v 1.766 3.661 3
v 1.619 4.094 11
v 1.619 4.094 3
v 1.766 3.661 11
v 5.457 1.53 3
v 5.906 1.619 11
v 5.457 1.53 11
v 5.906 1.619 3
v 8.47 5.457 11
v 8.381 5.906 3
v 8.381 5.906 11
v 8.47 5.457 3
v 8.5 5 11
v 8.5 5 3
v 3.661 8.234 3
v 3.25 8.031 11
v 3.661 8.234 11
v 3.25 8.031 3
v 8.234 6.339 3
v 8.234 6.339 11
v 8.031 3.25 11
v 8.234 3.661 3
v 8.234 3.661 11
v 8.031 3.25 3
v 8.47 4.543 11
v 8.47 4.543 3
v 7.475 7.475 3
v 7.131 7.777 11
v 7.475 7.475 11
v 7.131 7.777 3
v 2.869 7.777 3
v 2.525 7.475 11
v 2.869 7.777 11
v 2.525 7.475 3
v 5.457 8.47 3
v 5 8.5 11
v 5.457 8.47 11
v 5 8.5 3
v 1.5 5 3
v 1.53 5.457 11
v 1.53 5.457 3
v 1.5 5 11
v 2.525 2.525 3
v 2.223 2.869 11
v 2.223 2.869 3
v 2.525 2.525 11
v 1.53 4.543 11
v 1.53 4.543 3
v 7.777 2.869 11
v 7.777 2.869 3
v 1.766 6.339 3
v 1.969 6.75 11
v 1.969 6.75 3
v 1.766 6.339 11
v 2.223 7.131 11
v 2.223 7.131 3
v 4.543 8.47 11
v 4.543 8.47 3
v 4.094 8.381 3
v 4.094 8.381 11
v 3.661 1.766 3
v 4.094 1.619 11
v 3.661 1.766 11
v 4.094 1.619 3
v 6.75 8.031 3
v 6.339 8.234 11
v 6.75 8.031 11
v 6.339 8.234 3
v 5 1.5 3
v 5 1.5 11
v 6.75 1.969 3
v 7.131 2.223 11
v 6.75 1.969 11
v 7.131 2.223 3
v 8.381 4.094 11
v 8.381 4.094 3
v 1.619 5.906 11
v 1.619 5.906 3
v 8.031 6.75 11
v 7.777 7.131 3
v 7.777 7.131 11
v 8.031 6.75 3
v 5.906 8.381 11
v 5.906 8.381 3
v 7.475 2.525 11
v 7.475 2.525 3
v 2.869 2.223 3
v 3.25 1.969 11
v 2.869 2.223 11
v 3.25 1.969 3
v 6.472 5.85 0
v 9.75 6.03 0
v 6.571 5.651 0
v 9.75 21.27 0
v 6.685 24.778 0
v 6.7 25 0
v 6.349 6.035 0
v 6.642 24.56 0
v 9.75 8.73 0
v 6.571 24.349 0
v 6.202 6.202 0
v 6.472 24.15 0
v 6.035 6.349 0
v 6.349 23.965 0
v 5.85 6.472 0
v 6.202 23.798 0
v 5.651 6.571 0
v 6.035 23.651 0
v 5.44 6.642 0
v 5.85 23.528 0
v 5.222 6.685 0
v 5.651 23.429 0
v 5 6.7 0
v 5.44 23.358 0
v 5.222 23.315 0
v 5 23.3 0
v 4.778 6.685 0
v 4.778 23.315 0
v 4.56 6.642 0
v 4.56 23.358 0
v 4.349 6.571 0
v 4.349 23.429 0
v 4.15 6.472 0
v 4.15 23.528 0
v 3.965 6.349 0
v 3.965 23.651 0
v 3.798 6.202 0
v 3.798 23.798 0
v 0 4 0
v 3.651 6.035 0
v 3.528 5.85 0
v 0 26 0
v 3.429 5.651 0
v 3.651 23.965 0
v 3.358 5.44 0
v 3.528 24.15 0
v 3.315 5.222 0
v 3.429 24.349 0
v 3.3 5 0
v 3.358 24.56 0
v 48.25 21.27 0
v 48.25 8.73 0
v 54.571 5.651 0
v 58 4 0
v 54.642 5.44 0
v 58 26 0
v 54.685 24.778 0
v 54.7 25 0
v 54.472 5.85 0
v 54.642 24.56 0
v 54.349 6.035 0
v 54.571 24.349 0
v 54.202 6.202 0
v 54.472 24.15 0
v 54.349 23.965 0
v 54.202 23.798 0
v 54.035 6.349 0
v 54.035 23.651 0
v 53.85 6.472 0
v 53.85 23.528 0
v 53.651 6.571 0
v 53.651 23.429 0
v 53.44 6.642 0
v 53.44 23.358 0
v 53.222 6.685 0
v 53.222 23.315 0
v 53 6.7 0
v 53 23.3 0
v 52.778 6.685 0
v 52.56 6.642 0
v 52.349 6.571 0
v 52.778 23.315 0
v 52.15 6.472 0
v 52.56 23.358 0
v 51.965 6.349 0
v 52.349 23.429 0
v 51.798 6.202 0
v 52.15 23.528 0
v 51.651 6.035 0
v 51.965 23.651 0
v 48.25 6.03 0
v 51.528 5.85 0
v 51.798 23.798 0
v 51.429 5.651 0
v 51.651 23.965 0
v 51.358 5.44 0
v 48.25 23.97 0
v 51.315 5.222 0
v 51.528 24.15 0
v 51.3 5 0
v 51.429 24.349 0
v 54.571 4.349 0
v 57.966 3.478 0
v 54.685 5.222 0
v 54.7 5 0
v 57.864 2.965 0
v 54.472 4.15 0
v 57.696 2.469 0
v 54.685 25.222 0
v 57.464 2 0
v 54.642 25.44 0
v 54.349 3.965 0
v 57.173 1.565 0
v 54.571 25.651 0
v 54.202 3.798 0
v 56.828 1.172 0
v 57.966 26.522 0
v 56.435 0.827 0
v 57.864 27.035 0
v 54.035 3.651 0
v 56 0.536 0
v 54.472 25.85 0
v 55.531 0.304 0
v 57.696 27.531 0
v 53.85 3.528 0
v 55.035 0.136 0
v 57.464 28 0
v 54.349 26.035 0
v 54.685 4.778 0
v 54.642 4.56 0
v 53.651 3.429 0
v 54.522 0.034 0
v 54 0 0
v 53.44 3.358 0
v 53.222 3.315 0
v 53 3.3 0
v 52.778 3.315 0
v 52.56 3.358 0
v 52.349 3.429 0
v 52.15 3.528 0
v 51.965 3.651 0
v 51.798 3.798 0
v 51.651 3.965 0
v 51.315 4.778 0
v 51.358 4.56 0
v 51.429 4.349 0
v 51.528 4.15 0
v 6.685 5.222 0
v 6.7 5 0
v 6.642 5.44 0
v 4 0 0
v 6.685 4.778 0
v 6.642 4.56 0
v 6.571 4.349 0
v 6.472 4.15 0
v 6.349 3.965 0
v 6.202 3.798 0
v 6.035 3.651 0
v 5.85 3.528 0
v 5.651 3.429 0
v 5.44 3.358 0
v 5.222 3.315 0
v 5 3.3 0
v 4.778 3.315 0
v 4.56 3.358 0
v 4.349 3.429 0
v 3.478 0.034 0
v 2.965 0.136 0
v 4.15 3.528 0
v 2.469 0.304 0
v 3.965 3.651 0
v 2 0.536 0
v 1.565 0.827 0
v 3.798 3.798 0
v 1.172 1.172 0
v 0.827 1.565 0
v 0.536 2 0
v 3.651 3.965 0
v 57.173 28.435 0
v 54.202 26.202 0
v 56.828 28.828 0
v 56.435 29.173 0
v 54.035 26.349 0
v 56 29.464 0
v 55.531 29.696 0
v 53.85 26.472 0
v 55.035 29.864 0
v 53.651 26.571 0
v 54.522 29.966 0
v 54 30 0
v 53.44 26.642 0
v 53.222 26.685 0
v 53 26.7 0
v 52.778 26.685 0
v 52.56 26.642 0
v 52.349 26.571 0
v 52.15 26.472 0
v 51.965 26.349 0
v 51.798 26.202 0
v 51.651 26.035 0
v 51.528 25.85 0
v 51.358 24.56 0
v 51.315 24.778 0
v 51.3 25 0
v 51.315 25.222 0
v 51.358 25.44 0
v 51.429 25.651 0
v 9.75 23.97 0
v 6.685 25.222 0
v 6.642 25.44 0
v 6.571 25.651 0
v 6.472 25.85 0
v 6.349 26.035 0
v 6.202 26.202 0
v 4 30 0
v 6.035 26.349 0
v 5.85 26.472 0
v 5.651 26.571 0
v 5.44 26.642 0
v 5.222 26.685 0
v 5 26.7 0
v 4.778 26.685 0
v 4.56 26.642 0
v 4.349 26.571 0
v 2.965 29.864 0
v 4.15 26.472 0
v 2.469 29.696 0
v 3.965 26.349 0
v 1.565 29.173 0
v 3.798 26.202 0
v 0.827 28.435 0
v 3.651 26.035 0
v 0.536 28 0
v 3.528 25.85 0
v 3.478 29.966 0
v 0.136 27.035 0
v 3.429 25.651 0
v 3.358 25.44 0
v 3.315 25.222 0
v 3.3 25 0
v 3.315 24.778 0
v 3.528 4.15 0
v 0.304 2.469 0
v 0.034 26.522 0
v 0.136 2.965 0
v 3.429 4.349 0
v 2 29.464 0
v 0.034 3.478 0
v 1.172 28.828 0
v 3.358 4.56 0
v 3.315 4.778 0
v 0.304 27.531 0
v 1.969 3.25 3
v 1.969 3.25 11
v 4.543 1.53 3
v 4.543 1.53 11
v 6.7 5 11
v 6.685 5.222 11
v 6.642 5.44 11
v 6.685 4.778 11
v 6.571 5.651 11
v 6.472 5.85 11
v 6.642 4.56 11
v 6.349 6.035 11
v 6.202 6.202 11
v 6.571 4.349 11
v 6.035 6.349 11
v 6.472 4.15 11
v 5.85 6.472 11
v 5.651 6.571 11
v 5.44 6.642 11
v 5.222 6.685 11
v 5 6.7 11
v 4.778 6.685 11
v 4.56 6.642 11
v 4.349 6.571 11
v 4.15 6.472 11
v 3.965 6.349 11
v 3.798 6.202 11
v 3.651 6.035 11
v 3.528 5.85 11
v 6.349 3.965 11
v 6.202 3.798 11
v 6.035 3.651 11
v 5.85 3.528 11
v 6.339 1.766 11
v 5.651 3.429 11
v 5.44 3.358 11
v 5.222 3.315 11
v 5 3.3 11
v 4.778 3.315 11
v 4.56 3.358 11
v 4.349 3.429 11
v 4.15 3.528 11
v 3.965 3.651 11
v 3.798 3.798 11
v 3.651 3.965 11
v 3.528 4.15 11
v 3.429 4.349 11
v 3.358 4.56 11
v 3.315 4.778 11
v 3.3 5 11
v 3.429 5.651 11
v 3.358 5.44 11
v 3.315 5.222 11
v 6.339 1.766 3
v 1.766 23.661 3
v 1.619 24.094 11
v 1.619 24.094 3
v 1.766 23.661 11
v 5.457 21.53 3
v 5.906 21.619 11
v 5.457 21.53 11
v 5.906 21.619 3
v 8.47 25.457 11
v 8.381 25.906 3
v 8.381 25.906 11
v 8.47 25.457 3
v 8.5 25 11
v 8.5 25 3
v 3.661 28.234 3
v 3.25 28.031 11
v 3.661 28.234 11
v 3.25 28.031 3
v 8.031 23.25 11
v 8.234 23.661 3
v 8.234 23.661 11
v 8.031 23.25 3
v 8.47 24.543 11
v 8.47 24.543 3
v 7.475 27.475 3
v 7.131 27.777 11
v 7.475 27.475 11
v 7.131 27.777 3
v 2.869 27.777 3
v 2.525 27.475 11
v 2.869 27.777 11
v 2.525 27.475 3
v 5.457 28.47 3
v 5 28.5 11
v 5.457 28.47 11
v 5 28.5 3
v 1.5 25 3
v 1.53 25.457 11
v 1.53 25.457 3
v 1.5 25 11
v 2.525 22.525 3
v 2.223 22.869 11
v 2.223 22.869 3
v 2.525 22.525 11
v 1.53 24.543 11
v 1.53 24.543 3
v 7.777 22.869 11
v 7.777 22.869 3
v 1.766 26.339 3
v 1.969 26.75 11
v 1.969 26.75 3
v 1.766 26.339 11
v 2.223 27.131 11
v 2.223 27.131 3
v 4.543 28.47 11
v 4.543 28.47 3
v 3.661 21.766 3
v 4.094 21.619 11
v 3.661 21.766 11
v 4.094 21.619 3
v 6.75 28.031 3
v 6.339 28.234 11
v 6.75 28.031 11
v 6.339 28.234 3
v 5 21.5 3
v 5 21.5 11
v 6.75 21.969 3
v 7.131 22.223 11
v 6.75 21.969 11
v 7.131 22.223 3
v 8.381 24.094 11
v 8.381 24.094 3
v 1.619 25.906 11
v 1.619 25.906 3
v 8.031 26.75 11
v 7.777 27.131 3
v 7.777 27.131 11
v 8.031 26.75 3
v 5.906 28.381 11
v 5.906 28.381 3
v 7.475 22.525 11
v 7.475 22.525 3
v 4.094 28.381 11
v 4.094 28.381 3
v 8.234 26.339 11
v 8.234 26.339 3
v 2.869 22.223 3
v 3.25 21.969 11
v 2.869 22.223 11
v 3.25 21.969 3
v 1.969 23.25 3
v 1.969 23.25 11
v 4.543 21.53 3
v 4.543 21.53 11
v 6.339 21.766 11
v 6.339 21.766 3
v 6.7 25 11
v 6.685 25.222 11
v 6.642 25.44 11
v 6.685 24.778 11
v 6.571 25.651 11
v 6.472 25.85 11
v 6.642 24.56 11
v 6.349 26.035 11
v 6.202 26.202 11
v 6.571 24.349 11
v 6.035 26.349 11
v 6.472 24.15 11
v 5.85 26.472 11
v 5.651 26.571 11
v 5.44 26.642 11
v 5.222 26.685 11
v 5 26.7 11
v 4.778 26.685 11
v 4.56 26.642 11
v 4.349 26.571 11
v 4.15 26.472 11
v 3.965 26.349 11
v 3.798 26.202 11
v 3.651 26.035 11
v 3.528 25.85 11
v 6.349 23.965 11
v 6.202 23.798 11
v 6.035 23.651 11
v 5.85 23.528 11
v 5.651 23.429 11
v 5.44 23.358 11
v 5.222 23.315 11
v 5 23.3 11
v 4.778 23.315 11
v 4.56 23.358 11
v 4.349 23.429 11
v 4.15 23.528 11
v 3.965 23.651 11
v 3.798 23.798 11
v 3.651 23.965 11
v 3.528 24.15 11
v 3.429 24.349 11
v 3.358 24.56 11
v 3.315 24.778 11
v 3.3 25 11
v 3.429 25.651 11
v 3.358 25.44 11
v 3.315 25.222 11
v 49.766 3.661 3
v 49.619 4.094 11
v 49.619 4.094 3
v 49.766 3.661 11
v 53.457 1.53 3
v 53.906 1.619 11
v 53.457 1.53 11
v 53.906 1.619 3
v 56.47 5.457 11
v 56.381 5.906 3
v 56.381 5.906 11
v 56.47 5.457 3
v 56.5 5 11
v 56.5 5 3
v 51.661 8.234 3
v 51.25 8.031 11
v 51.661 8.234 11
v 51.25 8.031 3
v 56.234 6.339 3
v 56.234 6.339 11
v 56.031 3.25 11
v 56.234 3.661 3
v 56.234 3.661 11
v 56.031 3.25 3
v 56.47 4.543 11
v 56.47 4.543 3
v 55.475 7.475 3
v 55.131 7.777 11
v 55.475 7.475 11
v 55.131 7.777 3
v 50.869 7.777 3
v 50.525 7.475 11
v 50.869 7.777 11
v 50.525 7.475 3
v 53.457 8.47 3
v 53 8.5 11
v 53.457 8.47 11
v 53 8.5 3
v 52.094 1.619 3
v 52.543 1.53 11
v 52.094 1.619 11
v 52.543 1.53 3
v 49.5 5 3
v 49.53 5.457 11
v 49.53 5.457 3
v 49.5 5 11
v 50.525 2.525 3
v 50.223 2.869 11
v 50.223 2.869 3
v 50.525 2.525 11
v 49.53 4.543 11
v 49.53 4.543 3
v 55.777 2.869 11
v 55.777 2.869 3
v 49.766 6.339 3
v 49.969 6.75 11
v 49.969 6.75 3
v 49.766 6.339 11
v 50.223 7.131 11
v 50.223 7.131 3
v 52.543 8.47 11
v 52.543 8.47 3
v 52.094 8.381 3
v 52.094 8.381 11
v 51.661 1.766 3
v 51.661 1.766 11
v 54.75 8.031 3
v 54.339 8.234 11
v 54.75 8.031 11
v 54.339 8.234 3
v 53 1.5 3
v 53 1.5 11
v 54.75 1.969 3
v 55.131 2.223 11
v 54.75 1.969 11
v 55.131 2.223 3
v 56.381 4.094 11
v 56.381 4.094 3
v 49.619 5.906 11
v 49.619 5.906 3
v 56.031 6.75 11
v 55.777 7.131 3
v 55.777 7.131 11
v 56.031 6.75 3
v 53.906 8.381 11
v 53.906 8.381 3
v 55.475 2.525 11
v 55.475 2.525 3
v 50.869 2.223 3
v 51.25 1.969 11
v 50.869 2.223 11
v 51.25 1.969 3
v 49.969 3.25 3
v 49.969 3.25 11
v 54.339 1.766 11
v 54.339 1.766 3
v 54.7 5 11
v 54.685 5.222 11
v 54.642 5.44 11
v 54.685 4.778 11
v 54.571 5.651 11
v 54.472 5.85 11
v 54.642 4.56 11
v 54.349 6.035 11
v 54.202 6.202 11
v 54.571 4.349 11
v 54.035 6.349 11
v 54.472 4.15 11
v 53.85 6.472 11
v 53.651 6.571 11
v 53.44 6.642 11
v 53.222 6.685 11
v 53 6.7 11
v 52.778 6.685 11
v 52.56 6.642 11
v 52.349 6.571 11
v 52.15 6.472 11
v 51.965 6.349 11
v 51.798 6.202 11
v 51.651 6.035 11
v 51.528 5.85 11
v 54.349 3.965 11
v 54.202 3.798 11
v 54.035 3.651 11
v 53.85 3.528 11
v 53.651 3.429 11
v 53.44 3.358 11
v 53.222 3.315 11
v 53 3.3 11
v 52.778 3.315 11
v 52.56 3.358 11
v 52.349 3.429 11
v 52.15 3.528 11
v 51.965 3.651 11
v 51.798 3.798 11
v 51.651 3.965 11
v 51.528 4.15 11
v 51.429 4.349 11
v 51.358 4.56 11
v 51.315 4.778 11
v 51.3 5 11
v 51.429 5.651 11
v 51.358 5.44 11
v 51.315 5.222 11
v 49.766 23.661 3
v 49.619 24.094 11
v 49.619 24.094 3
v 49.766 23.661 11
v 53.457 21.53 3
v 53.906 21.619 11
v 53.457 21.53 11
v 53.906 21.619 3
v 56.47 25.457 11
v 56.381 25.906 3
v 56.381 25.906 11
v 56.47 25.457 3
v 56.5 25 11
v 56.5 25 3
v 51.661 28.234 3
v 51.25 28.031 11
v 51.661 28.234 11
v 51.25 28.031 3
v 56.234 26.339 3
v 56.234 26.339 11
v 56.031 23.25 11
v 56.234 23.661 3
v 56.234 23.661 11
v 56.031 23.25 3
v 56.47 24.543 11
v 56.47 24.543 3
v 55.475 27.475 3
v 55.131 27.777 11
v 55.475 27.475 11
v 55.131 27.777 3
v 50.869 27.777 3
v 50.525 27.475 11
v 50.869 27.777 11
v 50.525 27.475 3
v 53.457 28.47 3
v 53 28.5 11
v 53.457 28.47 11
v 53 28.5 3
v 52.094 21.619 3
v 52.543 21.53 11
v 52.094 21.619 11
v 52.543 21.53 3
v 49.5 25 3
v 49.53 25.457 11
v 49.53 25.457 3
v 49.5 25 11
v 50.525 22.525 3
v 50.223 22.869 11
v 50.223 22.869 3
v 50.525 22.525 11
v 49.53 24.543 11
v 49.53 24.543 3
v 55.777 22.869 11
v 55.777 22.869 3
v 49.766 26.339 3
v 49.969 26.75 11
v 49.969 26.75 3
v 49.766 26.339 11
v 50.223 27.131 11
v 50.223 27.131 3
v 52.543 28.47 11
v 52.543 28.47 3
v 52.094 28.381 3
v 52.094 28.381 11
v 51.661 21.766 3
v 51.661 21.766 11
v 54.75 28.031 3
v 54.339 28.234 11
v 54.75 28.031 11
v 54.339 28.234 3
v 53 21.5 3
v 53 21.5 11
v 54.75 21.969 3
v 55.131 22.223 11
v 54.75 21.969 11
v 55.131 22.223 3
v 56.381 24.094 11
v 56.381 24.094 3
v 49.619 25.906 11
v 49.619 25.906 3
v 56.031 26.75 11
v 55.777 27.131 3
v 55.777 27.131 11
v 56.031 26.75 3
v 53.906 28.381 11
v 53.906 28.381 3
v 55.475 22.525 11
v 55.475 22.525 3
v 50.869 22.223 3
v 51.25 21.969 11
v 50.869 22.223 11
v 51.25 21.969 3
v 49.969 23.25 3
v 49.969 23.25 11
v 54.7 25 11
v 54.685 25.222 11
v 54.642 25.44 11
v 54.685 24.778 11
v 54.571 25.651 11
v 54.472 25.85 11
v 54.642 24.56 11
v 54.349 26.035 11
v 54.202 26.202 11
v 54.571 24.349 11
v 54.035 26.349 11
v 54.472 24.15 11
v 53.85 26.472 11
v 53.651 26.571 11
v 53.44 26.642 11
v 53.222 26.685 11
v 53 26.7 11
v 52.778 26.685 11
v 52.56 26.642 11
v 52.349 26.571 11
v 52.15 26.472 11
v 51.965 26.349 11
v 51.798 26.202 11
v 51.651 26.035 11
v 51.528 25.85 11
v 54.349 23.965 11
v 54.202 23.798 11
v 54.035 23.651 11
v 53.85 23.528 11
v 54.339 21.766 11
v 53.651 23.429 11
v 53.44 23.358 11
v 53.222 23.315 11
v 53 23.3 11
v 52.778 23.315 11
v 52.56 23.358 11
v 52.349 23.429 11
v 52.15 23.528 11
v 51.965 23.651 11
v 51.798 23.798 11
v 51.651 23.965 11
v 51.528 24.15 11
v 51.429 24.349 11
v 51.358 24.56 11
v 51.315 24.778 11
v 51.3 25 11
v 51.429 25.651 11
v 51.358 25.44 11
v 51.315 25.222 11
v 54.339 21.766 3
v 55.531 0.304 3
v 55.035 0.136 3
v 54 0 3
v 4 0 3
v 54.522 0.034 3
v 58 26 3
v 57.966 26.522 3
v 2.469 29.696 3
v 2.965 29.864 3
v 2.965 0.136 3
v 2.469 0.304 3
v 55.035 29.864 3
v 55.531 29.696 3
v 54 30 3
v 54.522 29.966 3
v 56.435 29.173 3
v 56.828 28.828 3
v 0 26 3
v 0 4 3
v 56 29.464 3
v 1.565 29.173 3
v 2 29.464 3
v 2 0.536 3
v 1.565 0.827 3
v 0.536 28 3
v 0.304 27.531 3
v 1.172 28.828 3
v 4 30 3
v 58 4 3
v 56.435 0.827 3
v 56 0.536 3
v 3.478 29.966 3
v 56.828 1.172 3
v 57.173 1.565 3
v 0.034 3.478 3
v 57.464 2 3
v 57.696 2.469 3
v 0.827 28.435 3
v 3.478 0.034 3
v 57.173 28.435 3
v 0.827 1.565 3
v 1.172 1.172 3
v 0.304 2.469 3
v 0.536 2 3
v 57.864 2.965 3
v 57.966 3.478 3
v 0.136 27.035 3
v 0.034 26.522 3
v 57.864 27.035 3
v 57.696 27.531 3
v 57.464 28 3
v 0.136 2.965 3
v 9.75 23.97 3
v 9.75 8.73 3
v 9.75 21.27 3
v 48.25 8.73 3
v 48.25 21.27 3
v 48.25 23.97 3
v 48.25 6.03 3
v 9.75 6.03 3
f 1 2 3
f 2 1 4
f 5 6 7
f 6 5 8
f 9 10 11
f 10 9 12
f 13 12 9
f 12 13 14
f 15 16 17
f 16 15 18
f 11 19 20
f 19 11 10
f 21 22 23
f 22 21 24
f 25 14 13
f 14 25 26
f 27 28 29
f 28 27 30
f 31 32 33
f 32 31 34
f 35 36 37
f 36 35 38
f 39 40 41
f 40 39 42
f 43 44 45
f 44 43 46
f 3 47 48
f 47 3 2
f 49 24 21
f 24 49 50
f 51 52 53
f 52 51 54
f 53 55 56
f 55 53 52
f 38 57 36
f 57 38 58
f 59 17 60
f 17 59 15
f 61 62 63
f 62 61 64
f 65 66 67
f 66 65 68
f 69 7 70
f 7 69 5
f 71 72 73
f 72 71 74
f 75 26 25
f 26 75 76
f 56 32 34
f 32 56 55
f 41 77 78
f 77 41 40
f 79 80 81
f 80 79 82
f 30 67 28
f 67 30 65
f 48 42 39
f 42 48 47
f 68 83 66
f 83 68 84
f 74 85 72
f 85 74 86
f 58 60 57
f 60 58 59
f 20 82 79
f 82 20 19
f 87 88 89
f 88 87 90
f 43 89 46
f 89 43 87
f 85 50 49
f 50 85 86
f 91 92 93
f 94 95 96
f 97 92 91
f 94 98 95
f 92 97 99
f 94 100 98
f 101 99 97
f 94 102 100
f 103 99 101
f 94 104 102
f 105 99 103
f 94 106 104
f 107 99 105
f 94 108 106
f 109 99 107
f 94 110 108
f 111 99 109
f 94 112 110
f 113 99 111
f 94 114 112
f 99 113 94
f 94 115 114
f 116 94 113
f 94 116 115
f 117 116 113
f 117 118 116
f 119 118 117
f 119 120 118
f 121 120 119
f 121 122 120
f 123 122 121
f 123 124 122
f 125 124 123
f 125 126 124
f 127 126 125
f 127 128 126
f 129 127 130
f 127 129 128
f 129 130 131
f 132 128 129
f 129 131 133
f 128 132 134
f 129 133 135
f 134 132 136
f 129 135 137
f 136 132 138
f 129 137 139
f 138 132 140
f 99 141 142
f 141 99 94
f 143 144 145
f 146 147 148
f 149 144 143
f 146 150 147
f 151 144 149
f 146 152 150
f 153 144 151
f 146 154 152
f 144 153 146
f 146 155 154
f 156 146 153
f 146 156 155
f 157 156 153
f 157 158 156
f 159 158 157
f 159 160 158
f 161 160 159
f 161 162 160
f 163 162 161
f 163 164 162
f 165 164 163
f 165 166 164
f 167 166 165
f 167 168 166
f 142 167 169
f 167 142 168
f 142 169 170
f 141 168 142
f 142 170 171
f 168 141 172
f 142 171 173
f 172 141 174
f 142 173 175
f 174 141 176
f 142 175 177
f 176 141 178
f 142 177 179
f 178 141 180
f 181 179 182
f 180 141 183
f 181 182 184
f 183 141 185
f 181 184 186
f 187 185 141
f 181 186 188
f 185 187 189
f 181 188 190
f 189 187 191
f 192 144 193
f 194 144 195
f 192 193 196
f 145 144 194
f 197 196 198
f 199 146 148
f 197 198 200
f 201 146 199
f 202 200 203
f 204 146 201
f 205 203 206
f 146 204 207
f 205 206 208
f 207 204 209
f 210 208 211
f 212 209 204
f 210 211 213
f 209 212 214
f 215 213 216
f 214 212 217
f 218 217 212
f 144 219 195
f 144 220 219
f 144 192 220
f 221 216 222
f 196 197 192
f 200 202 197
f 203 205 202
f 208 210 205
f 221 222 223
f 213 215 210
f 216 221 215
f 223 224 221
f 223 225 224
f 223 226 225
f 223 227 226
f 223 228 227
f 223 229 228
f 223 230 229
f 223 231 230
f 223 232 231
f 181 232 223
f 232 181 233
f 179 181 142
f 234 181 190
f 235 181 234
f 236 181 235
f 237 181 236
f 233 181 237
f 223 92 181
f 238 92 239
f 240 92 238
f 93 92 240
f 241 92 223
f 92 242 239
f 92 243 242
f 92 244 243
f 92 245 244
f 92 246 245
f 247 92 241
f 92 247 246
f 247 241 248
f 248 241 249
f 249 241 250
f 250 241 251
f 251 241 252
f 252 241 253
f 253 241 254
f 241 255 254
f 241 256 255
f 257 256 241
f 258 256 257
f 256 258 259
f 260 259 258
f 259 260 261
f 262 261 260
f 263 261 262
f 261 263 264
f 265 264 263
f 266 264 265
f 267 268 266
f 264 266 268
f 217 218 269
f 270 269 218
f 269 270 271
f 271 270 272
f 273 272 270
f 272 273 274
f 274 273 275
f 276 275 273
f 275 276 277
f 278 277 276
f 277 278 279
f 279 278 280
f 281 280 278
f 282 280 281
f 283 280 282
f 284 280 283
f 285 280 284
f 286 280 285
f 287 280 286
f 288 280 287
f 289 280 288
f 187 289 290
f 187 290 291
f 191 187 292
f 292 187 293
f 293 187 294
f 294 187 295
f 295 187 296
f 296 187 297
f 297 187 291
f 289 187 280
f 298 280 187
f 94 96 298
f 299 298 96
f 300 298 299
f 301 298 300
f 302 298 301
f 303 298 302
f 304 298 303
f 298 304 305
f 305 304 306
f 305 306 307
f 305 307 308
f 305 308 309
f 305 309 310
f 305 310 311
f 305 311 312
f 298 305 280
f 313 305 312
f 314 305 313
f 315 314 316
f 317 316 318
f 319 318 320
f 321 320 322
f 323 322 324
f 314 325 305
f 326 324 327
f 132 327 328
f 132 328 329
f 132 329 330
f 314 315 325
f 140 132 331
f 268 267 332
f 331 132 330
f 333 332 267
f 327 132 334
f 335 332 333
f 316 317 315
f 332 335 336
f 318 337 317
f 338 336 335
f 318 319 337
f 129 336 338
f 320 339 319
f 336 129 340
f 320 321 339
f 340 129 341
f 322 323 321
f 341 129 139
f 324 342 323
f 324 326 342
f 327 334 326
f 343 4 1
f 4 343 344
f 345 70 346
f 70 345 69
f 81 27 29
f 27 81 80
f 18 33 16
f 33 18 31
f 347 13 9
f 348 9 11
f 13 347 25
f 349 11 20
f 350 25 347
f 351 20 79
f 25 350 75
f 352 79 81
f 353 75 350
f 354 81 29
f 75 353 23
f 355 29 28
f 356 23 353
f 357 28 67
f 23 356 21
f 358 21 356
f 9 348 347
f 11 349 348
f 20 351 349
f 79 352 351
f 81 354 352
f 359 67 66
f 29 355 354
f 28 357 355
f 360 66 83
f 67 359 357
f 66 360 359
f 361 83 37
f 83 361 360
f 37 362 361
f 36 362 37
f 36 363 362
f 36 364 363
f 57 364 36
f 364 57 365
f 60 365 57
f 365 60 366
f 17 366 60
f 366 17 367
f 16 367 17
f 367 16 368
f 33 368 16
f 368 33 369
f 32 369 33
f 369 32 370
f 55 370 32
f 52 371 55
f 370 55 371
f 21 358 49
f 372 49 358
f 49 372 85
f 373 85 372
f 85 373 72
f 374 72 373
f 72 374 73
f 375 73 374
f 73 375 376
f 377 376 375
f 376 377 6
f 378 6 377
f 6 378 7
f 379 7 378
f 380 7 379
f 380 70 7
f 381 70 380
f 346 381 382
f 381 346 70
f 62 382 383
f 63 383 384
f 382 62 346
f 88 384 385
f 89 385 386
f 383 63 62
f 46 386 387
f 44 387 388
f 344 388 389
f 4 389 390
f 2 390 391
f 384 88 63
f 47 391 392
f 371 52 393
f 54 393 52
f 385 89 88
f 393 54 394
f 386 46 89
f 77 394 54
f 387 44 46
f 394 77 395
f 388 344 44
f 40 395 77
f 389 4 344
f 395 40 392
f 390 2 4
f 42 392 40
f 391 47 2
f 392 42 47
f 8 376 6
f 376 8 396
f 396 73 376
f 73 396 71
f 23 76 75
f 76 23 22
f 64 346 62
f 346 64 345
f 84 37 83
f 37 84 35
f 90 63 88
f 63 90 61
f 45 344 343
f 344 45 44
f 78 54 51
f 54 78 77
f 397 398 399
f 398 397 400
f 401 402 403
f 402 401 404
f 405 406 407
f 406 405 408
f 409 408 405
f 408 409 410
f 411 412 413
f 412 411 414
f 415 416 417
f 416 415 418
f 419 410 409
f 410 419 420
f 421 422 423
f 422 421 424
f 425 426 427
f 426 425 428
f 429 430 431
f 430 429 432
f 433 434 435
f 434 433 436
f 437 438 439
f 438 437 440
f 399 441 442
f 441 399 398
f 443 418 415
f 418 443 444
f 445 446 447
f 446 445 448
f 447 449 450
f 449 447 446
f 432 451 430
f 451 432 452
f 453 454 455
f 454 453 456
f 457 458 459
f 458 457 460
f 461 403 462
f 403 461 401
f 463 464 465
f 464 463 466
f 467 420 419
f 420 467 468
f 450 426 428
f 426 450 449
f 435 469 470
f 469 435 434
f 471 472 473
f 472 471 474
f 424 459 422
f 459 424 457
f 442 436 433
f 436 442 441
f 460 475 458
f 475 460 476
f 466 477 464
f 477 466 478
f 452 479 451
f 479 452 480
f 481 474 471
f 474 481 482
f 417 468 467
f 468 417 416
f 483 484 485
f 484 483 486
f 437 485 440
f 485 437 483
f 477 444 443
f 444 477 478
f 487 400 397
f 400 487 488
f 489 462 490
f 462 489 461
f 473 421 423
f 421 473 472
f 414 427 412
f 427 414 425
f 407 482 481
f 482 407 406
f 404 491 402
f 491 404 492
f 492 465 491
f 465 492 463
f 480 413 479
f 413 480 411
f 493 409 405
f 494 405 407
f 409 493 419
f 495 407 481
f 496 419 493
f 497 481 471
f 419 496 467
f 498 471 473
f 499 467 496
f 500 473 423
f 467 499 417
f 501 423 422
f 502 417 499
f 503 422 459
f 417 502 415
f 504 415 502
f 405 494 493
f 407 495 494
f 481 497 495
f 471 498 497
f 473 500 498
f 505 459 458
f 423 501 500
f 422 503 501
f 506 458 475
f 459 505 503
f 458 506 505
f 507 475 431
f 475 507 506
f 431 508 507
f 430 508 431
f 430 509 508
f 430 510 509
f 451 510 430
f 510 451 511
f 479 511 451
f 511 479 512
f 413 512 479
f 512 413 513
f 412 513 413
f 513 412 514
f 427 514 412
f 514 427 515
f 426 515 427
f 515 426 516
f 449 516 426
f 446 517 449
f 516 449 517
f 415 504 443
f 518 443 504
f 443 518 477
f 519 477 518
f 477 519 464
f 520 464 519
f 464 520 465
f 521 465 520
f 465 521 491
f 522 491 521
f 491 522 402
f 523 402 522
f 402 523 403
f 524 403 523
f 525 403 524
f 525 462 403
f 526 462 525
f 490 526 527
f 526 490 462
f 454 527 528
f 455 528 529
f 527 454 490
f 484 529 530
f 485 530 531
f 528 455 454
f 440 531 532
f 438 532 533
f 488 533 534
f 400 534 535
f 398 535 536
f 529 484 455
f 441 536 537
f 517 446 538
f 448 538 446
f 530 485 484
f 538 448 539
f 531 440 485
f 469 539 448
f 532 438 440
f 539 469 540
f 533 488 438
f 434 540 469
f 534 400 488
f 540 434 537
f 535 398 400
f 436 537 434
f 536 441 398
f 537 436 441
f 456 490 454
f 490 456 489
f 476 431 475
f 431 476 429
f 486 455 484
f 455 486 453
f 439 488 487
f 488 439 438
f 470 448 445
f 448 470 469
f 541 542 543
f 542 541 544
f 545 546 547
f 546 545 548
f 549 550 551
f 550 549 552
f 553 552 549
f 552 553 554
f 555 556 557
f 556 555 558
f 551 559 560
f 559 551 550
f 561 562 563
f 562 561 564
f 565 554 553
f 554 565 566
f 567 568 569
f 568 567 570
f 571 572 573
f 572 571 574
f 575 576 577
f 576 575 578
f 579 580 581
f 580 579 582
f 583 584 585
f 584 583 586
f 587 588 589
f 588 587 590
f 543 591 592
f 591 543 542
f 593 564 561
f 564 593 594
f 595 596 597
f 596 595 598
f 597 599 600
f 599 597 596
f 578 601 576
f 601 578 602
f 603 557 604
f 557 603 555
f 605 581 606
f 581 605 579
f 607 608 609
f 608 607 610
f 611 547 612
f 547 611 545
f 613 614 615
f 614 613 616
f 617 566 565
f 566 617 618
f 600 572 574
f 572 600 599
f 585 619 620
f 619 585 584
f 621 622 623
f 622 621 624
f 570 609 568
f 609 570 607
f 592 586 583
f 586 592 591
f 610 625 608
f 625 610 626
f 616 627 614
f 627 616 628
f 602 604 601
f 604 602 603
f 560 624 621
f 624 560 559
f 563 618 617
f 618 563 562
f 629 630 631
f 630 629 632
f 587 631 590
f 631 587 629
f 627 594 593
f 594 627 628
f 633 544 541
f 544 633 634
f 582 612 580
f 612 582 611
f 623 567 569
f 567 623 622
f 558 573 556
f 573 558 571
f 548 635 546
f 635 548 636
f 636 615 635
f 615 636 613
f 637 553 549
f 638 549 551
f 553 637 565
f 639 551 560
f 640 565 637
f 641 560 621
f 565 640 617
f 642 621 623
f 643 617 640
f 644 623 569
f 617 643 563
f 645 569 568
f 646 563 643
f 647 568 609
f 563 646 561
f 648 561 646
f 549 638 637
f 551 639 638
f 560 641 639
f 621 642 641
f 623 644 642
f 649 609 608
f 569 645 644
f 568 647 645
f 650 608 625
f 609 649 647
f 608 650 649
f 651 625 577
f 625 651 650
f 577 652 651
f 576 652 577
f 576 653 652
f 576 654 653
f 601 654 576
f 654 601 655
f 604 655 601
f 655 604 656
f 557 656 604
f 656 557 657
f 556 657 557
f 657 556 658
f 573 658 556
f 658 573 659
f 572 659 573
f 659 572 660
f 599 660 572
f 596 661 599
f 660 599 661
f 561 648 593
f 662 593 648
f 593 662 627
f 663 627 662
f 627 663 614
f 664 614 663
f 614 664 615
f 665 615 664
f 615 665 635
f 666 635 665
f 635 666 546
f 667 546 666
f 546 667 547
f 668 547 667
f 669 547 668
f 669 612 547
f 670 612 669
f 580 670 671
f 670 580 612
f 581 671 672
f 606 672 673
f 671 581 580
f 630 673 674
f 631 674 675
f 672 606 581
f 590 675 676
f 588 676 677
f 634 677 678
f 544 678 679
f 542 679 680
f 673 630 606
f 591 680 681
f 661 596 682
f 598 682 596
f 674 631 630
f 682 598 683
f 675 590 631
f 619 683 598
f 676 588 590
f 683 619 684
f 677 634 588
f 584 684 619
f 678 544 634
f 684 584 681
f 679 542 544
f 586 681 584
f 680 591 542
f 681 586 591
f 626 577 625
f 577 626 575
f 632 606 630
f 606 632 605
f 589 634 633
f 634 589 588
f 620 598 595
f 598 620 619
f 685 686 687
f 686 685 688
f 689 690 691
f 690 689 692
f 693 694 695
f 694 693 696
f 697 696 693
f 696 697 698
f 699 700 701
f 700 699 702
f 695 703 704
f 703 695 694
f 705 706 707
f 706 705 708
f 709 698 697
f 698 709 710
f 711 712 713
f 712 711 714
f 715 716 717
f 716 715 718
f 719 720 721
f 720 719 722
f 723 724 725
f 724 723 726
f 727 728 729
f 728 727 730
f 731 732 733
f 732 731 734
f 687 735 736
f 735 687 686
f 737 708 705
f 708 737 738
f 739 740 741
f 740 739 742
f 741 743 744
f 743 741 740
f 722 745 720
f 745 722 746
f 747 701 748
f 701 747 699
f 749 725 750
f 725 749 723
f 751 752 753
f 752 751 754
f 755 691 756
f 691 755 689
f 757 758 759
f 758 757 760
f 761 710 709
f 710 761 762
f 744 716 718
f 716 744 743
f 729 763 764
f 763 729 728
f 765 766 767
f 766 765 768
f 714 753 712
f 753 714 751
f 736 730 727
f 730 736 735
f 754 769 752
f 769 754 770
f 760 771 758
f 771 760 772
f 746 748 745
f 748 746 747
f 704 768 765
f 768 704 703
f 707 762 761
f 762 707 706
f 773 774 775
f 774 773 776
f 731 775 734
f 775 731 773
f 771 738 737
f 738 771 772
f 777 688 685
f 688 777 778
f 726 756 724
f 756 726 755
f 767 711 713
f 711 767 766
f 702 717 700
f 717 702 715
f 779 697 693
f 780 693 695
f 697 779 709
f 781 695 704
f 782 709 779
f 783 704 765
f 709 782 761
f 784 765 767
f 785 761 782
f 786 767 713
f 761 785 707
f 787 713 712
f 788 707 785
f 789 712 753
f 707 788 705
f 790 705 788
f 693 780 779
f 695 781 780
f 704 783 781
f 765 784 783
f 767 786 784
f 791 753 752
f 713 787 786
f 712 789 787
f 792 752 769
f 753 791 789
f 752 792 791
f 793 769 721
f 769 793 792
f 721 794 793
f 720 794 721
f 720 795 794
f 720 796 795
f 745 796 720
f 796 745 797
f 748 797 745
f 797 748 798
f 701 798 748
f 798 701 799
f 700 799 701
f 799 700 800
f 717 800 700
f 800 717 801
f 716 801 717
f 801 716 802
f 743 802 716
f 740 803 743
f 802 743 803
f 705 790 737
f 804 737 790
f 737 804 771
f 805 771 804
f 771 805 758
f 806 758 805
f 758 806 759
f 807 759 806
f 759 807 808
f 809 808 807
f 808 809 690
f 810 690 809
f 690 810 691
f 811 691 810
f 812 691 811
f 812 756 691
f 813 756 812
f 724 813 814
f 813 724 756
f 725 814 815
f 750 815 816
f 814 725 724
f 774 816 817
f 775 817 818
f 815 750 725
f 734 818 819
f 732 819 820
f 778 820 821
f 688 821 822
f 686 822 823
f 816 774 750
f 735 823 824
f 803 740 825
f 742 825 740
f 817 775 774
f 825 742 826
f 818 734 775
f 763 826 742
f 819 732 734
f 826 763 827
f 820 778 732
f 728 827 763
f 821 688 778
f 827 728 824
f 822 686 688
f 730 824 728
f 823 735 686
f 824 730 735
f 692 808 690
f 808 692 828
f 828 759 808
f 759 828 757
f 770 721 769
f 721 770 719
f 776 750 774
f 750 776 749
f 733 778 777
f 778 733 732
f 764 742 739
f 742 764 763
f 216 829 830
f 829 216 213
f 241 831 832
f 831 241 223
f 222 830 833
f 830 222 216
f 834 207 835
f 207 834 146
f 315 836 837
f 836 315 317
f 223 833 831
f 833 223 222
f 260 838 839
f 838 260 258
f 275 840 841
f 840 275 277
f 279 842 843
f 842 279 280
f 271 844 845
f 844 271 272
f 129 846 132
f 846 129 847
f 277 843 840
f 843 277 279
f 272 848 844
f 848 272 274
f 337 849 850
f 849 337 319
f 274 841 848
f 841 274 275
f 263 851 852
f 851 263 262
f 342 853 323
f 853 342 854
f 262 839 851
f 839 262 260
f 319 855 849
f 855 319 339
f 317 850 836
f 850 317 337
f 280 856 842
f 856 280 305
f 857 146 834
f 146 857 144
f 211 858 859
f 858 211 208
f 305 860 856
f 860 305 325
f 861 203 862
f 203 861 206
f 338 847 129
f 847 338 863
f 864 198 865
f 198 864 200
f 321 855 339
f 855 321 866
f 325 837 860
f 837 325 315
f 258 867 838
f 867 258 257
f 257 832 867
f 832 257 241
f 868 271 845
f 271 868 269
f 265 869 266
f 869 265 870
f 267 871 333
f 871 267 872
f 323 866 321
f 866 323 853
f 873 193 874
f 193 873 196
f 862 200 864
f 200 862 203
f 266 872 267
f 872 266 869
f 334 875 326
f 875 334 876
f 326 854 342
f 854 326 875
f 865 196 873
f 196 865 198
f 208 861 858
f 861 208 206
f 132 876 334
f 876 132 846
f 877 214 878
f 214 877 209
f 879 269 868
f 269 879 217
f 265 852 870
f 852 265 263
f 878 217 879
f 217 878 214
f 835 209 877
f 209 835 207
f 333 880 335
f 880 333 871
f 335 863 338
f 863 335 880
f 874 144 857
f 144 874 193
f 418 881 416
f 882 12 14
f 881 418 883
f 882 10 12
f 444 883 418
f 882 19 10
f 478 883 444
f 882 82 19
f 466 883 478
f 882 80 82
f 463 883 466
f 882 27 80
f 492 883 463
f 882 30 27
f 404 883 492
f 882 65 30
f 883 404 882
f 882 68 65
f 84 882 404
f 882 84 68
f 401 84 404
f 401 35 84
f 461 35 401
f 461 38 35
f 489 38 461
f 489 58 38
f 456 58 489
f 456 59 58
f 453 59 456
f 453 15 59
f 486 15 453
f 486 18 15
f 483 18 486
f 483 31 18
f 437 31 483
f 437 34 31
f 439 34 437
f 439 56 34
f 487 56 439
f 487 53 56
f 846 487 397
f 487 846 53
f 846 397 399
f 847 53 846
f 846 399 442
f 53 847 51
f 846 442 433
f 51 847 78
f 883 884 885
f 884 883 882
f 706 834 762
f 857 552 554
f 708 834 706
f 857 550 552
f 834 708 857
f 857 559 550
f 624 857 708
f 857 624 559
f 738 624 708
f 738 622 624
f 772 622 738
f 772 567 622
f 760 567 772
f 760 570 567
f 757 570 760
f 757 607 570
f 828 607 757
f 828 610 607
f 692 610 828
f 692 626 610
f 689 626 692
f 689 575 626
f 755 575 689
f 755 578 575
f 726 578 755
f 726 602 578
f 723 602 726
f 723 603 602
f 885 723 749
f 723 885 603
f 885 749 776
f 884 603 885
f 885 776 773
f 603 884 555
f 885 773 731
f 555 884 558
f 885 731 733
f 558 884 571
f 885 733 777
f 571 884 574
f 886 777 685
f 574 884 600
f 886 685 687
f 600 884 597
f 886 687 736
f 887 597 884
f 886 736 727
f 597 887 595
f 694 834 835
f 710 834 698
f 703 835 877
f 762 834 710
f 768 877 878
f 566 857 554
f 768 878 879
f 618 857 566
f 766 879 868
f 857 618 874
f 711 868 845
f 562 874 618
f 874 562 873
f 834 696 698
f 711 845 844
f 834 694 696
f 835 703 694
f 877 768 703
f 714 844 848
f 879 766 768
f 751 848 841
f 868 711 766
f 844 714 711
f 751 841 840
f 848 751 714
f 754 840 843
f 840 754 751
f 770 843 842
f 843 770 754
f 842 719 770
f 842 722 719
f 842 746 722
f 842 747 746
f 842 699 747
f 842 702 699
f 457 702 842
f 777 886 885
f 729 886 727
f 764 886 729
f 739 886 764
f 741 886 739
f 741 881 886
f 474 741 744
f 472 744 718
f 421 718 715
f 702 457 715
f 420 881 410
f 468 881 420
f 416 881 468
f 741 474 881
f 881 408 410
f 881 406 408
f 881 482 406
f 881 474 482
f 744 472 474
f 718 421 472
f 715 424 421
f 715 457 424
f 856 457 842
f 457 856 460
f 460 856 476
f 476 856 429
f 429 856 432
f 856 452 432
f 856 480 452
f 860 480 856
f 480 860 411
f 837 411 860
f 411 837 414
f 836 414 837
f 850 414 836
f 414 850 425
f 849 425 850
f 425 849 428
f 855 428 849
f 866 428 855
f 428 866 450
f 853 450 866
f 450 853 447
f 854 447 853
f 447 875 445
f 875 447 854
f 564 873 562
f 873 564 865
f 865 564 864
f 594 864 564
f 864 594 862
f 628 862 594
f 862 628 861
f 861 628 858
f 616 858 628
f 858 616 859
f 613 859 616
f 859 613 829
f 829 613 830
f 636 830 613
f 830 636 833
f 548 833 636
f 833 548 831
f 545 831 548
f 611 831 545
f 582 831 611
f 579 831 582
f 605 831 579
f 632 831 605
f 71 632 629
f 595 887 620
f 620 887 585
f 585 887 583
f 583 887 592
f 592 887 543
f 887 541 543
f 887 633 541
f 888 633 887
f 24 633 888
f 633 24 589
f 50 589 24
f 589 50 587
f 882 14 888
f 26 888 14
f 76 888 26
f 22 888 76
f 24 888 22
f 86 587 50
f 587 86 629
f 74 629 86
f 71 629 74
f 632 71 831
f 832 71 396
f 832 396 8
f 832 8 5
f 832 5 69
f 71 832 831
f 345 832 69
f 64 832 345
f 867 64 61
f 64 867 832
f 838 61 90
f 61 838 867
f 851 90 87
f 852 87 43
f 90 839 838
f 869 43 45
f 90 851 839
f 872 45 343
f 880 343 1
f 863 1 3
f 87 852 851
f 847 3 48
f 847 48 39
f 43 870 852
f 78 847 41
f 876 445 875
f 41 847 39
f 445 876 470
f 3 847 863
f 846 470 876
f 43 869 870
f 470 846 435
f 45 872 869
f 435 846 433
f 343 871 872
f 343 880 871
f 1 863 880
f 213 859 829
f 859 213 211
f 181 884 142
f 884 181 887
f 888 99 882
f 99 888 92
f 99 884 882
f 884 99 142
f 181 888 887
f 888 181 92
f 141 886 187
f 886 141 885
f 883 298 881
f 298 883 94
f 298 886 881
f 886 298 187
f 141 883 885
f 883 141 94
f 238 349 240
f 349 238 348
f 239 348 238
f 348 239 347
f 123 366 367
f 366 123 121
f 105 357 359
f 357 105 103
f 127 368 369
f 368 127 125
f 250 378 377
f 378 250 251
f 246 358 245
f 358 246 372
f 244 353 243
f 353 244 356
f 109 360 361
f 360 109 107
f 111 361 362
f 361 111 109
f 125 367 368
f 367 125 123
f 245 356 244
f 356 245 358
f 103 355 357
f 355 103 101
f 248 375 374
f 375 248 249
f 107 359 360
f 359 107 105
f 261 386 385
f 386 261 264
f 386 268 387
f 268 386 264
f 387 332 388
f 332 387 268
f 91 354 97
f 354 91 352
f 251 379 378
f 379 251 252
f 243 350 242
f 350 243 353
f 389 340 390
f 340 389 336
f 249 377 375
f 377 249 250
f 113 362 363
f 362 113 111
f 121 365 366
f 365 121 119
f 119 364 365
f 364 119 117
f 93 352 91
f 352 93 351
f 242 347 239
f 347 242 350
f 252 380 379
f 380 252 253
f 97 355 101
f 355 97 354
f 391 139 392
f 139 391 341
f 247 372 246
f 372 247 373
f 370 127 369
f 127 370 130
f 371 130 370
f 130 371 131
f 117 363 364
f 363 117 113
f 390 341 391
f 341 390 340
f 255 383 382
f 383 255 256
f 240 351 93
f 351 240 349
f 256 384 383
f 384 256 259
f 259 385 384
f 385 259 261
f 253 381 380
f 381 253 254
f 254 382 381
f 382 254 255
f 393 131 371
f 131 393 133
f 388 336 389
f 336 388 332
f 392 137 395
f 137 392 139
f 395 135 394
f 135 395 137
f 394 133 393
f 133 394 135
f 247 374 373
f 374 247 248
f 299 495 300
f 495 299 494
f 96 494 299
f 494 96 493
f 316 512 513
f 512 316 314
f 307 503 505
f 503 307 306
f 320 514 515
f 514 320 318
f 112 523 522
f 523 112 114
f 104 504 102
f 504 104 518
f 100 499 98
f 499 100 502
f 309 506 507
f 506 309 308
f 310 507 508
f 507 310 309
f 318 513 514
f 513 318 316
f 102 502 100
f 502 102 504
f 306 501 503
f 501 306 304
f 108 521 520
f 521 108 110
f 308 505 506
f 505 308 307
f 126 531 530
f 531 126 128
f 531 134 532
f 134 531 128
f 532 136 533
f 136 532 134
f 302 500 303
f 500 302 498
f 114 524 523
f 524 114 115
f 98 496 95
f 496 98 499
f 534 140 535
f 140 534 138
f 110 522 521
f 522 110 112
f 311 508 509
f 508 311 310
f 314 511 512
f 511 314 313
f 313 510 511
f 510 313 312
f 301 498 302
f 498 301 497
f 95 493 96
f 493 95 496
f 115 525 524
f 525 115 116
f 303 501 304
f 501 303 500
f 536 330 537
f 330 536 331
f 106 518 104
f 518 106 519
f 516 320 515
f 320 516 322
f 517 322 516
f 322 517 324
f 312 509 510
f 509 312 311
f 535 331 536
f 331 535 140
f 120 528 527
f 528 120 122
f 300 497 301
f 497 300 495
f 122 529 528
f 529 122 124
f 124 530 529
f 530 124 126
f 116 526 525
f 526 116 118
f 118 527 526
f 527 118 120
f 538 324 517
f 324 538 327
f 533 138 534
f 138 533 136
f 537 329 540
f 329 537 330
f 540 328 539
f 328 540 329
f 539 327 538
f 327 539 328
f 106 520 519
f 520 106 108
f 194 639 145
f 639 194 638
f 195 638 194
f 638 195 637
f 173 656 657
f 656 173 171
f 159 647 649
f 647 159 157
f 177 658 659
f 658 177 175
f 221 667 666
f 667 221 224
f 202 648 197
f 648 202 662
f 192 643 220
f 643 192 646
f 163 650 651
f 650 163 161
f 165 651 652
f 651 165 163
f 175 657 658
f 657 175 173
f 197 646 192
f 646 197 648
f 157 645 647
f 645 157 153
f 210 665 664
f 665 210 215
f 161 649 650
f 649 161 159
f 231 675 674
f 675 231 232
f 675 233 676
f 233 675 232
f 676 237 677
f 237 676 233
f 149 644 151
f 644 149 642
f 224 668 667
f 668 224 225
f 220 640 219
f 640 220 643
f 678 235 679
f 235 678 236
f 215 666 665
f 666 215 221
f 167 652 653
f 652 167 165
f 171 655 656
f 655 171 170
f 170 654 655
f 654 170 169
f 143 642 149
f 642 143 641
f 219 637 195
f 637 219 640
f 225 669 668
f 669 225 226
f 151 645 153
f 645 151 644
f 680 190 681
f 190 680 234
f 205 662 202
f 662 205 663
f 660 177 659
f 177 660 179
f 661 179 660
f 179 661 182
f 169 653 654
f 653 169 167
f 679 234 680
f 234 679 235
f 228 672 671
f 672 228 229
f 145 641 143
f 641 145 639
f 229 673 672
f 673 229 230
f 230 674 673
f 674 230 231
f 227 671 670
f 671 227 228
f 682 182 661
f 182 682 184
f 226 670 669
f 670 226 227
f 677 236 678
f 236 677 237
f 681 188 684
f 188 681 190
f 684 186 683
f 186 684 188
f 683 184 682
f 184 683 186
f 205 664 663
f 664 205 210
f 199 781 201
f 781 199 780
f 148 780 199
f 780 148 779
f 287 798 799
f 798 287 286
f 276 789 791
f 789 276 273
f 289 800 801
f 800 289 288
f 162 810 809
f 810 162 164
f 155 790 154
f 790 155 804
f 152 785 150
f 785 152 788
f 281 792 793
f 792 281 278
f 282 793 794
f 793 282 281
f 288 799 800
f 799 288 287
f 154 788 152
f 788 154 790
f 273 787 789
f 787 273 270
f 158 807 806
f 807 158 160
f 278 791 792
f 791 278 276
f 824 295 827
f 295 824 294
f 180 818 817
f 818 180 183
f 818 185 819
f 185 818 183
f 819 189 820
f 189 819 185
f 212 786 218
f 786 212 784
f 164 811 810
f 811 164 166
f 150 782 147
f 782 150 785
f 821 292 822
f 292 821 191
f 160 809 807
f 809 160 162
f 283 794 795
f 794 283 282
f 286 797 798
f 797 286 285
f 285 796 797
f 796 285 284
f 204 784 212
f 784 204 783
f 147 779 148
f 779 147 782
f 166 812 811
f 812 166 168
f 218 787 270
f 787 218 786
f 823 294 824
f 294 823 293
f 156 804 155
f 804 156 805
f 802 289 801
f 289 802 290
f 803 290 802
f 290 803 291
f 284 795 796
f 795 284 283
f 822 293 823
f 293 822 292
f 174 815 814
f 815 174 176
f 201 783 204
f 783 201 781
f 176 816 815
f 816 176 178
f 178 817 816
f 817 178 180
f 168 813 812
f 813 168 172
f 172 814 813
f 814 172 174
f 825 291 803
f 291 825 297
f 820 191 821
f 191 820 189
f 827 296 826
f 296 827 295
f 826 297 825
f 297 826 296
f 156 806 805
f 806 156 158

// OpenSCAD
// Nano header carrier - The Build Book
// https://tobno683.github.io/arduino-build-book/basics/printing.html#prints
//
// Printed plate-down. Turned over, the corner posts are its feet.
// Press a female header strip into each slot, flush with the underside.
//
// Millimetres. Change the numbers at the top and render (F6); everything
// below follows from them. Written by tools/make-prints.js from the same
// numbers as the STL next to it.

/* [Board] */
pins = 15;        // per row
pitch = 2.54;
rows = 15.24;     // centre to centre across the two pin rows - MEASURE YOURS

/* [Carrier] */
slot_w = 2.7;      // a female header is about 2.5 mm wide, and printed slots come out narrow
slot_extra = 0.4;  // added to the slot length
plate = [58, 30];
plate_t = 3;
corner_r = 4;
foot_d = 7;
foot_h = 8;       // room under the carrier for the header pins and wiring
foot_hole = 3.4;  // M3 clearance - use your fit-test result
foot_inset = 5;

/* [Hidden] */
$fn = 48;

slot_len = pins * pitch + slot_extra;

module rounded_rect(size, r) {
  translate([r, r]) offset(r = r) square([size[0] - 2 * r, size[1] - 2 * r]);
}

difference() {
  union() {
    linear_extrude(plate_t) rounded_rect(plate, corner_r);
    for (x = [foot_inset, plate[0] - foot_inset], y = [foot_inset, plate[1] - foot_inset])
      translate([x, y, 0]) cylinder(d = foot_d, h = plate_t + foot_h);
  }
  for (s = [-1, 1])
    translate([plate[0] / 2 - slot_len / 2, plate[1] / 2 + s * rows / 2 - slot_w / 2, -1])
      cube([slot_len, slot_w, plate_t + 2]);
  for (x = [foot_inset, plate[0] - foot_inset], y = [foot_inset, plate[1] - foot_inset])
    translate([x, y, -1]) cylinder(d = foot_hole, h = plate_t + foot_h + 2);
}
